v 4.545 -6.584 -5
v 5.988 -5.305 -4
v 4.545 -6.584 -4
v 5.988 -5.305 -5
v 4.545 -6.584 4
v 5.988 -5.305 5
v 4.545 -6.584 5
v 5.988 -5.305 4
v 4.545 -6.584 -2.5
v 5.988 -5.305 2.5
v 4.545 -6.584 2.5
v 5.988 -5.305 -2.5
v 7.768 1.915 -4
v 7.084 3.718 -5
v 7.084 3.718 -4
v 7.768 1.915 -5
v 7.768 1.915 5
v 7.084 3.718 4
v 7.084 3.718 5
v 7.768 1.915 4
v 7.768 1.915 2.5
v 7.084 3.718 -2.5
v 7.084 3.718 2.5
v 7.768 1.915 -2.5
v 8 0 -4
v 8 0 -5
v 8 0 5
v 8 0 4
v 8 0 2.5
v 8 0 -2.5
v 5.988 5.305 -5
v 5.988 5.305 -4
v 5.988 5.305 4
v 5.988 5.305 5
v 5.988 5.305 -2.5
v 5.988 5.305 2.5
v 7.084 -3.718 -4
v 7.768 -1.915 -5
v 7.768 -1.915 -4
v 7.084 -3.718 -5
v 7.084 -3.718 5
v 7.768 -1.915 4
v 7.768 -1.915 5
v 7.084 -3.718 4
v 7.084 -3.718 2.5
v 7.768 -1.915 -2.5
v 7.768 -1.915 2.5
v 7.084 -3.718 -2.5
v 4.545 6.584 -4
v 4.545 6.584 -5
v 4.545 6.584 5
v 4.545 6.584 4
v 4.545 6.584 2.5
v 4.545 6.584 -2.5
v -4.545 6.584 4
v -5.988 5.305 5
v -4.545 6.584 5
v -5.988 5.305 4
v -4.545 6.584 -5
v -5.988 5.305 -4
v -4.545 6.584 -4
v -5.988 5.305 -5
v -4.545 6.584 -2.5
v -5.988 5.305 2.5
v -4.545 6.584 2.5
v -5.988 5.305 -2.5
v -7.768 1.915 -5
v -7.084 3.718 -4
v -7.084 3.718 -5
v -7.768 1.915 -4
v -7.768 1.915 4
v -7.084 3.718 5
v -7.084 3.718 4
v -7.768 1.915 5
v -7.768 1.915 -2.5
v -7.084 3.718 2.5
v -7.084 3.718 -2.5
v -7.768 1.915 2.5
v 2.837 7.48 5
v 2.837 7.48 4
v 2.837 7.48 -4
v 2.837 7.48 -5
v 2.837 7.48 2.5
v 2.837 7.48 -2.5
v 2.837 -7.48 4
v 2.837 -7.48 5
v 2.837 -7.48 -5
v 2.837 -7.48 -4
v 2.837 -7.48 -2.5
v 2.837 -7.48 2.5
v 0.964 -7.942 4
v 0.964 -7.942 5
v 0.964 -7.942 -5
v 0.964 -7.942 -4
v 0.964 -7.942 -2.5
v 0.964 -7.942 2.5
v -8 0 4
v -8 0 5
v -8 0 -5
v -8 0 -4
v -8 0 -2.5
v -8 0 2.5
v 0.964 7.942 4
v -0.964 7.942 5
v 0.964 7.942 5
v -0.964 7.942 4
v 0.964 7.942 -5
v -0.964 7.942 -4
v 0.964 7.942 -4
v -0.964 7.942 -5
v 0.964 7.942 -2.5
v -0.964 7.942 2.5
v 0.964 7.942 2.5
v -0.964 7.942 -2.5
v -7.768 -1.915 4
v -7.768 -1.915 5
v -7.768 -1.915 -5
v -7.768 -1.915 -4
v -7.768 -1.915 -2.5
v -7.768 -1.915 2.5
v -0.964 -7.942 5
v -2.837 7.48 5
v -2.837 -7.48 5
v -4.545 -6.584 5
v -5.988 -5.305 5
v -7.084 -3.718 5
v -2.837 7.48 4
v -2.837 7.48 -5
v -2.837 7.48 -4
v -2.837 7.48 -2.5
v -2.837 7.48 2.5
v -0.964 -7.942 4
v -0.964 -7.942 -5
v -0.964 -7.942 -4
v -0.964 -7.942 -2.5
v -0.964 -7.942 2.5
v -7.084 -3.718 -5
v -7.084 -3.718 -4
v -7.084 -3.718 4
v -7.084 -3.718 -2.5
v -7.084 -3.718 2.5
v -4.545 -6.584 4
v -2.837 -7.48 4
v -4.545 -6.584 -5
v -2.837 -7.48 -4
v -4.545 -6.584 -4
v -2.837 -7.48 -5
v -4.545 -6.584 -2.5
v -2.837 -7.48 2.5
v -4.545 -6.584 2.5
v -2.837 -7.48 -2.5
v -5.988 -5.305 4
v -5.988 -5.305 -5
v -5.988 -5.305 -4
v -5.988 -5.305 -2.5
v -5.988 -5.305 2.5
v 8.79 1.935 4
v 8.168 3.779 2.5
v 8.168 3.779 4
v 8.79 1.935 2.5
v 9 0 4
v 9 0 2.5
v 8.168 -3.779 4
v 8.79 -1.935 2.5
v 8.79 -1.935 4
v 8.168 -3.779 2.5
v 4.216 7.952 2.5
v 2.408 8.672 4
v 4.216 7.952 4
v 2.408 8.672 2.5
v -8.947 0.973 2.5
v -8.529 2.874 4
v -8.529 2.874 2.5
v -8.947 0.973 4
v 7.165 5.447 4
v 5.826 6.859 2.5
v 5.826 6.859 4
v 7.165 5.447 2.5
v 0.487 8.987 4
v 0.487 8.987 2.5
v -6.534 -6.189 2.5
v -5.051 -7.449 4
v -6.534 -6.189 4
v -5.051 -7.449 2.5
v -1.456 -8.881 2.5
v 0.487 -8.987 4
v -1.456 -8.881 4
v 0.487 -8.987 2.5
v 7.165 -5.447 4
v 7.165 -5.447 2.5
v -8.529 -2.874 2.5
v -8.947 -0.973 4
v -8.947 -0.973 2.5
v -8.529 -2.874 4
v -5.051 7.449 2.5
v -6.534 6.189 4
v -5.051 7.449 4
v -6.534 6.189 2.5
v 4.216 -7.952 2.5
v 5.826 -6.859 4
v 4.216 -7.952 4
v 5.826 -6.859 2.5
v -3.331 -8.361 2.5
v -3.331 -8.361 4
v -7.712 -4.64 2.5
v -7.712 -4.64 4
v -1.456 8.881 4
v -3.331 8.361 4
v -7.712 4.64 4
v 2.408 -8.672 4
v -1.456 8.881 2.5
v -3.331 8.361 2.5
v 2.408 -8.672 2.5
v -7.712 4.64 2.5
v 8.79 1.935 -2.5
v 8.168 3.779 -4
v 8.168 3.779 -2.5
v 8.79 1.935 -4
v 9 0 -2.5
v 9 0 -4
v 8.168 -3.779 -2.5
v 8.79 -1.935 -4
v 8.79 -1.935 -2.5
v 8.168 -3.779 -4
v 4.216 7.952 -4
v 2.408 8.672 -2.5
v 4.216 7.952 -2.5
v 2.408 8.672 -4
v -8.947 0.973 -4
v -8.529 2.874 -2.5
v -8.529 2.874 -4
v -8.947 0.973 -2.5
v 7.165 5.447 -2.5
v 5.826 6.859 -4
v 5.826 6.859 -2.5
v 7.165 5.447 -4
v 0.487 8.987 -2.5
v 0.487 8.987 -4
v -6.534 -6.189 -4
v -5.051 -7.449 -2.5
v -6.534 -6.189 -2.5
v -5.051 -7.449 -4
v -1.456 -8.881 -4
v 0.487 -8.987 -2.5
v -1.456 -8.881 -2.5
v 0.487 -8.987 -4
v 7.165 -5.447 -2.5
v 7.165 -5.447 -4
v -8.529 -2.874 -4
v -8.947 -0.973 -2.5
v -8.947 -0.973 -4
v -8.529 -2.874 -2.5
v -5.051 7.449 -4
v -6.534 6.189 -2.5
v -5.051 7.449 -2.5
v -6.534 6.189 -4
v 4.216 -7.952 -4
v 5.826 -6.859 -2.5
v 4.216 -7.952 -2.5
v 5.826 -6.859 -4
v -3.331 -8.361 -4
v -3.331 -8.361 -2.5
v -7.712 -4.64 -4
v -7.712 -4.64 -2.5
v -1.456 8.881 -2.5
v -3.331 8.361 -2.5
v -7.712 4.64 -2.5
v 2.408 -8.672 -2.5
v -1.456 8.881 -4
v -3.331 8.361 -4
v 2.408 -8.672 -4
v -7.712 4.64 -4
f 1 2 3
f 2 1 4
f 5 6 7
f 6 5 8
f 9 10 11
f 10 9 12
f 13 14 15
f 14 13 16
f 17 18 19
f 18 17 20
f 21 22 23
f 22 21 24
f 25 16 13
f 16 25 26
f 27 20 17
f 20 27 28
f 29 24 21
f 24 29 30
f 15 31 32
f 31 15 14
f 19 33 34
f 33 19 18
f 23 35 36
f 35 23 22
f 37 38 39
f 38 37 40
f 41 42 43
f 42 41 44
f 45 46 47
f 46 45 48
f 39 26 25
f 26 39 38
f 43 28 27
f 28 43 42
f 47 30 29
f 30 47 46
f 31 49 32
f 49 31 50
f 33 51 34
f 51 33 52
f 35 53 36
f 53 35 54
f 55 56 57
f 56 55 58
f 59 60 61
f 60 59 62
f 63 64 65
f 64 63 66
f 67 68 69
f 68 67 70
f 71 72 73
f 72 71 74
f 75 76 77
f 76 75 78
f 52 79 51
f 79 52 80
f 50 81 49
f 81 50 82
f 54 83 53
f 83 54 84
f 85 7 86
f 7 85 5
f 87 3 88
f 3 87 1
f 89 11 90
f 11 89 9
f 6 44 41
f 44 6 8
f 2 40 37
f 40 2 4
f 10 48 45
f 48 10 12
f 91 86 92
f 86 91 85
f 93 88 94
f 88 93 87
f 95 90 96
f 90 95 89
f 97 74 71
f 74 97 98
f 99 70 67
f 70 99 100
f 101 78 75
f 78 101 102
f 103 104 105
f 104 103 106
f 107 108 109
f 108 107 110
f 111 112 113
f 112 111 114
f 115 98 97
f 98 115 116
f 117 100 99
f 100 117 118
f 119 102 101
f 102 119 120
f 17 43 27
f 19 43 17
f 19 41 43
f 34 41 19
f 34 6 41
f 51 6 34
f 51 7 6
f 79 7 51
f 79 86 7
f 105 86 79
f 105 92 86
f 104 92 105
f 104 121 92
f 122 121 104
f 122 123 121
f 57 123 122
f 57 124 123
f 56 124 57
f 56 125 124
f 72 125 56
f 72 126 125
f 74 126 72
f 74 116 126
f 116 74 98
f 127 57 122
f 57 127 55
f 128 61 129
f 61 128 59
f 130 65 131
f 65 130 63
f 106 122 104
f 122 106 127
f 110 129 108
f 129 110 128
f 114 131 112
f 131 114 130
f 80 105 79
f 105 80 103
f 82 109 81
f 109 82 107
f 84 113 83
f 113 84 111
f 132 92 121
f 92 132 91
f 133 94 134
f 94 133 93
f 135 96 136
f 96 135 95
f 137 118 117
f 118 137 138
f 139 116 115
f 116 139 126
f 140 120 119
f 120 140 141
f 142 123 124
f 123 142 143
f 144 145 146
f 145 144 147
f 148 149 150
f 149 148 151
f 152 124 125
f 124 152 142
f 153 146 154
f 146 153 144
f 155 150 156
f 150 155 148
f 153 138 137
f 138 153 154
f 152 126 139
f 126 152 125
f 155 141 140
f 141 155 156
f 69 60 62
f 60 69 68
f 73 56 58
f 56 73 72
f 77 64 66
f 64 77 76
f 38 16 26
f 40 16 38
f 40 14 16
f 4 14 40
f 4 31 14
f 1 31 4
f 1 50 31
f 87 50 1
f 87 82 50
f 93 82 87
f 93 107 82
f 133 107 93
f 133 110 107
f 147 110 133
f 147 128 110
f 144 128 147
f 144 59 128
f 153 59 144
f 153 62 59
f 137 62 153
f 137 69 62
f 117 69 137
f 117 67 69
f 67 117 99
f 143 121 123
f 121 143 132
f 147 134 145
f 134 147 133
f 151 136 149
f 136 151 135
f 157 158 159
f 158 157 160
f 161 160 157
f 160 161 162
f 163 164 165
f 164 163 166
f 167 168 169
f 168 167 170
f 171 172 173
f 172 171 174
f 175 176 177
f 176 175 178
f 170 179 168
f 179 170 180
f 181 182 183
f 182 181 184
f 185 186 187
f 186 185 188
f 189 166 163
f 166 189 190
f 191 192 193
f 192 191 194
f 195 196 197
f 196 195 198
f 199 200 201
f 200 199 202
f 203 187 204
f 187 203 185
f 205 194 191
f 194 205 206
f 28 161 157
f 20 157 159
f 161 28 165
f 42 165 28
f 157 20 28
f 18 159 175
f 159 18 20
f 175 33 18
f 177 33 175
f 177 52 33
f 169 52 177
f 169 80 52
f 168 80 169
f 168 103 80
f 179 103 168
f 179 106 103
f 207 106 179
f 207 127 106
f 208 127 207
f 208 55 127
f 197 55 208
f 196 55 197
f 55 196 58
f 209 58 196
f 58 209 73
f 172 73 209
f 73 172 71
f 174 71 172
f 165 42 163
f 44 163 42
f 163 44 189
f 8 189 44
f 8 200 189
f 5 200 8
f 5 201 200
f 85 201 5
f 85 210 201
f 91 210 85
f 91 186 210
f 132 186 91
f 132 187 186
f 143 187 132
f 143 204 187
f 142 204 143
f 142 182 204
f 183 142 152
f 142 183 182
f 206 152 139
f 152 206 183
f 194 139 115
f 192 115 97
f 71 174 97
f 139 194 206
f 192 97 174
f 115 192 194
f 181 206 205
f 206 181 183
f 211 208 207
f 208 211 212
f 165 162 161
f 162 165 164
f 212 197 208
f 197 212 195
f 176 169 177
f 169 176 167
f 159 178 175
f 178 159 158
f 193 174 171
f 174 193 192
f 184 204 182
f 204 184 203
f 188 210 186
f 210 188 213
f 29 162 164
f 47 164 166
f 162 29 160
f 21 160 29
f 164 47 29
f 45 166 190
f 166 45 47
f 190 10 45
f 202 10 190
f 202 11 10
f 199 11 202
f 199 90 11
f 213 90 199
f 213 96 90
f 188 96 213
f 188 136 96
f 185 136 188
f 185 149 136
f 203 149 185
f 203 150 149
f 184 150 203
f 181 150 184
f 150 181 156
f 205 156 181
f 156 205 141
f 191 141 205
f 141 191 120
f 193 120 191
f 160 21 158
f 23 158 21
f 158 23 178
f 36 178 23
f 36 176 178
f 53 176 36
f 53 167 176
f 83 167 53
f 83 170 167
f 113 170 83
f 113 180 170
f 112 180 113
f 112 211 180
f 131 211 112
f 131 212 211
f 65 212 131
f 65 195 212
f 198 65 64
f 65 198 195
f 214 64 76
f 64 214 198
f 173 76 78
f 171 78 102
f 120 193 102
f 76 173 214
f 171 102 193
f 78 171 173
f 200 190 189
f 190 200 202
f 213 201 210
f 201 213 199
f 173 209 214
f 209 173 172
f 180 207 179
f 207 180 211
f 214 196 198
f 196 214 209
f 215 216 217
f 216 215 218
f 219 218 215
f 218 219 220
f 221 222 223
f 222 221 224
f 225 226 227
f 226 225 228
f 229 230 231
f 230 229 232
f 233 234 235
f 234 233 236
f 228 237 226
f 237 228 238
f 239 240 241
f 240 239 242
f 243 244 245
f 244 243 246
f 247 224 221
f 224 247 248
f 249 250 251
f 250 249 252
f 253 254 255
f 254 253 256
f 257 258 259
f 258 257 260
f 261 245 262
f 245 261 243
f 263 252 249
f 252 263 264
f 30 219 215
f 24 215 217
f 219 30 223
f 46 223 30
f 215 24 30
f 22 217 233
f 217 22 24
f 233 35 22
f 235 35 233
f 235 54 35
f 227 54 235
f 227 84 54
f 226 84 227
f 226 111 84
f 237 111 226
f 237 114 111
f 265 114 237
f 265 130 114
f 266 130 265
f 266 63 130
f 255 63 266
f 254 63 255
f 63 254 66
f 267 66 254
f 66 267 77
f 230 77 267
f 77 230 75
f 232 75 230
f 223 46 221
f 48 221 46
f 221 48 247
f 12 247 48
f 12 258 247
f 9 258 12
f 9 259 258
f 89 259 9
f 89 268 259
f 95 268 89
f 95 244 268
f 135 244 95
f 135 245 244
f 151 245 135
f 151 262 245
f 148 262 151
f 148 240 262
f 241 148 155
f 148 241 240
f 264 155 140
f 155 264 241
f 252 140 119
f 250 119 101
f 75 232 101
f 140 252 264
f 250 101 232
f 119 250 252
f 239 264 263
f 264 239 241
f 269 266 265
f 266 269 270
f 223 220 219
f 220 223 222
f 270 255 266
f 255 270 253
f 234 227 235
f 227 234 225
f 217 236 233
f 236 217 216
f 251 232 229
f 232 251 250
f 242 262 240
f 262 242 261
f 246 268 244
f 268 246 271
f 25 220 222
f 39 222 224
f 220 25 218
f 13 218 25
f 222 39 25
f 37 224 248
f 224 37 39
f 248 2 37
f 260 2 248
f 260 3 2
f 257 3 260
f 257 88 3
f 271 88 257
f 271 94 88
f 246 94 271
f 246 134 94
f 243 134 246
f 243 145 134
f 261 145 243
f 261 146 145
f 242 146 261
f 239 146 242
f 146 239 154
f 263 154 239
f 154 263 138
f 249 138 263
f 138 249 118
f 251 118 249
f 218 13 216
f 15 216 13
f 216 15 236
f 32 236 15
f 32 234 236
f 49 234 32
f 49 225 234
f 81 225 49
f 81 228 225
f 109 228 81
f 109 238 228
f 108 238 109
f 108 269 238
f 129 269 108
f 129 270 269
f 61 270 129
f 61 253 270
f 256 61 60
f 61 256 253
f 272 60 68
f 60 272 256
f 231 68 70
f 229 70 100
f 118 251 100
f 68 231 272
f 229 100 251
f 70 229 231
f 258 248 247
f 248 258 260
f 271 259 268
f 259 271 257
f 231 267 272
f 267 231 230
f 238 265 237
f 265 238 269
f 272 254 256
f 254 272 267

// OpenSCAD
// Parameters
tooth_count = 20; //[10:80:1]
pitch_diameter_mm = 12.22; //[6.11:24.44:0.01]
belt_pitch_mm = 2; //[1:10:0.01]
pulley_width_mm = 7; //[4:20:0.1]
bore_diameter_mm = 5; //[1:12:0.1]
hub_diameter_mm = 16; //[10:32:0.1]
hub_length_mm = 10; //[5:25:0.1]
flange_diameter_mm = 18; //[12:40:0.1]
flange_thickness_mm = 1.5; //[0.8:4:0.1]
set_screw_count = 2; //[0:4:1]
set_screw_thread = 3; //[2:6:1]
set_screw_z_offset_mm = 0; //[-6:6:0.1]
tolerances_mm = 0.25; //[0.1:0.6:0.01]
overlap_mm = 1; //[0.5:2:0.1]
gt2_tooth_r_mm = 0.555; //[0.3:1.2:0.001]
tooth_radial_height_mm = 0.75; //[0.3:1.5:0.01]
tooth_root_clearance_mm = 0.6; //[0.2:1.5:0.01]

// Pulley - complete geometry
module pulley() {
  color("Silver") {
    // Toothed pulley body
    cylinder(r=pitch_diameter_mm/2 + tooth_radial_height_mm, h=pulley_width_mm, center=true);
    
    // Hub
    translate([0, 0, 0])
      cylinder(r=hub_diameter_mm/2, h=hub_length_mm, center=true);
    
    // Flanges
    translate([0, 0, pulley_width_mm/2 + flange_thickness_mm/2 - overlap_mm])
      cylinder(r=flange_diameter_mm/2, h=flange_thickness_mm, center=true);
    translate([0, 0, -pulley_width_mm/2 - flange_thickness_mm/2 + overlap_mm])
      cylinder(r=flange_diameter_mm/2, h=flange_thickness_mm, center=true);
  }
}

// Printed Pulley Teeth - detailed geometry
module printed_pulley_teeth() {
  color("DimGray") {
    // Approximate GT2 teeth
    for (i = [0:tooth_count-1]) {
      rotate([0, 0, i * 360 / tooth_count])
        translate([pitch_diameter_mm/2, 0, 0])
        cylinder(r=gt2_tooth_r_mm, h=pulley_width_mm + 2*overlap_mm, center=true);
    }
  }
}

// Printed Pulley Teeth From Profile - detailed geometry
module printed_pulley_teeth_from_profile() {
  color("DimGray") {
    // Profile-based teeth
    for (i = [0:tooth_count-1]) {
      rotate([0, 0, i * 360 / tooth_count])
        translate([pitch_diameter_mm/2, 0, 0])
        cylinder(r=gt2_tooth_r_mm, h=pulley_width_mm + 2*overlap_mm, center=true);
    }
  }
}

// Printed Pulley GT2 Teeth - detailed geometry
module printed_pulley_GT2_teeth() {
  color("DimGray") {
    // GT2 teeth approximation
    for (i = [0:tooth_count-1]) {
      rotate([0, 0, i * 360 / tooth_count])
        translate([pitch_diameter_mm/2, 0, 0])
        cylinder(r=gt2_tooth_r_mm, h=pulley_width_mm + 2*overlap_mm, center=true);
    }
  }
}

// Assembly
module assembly() {
  pulley();
  printed_pulley_teeth();
  printed_pulley_teeth_from_profile();
  printed_pulley_GT2_teeth();
}

assembly();
